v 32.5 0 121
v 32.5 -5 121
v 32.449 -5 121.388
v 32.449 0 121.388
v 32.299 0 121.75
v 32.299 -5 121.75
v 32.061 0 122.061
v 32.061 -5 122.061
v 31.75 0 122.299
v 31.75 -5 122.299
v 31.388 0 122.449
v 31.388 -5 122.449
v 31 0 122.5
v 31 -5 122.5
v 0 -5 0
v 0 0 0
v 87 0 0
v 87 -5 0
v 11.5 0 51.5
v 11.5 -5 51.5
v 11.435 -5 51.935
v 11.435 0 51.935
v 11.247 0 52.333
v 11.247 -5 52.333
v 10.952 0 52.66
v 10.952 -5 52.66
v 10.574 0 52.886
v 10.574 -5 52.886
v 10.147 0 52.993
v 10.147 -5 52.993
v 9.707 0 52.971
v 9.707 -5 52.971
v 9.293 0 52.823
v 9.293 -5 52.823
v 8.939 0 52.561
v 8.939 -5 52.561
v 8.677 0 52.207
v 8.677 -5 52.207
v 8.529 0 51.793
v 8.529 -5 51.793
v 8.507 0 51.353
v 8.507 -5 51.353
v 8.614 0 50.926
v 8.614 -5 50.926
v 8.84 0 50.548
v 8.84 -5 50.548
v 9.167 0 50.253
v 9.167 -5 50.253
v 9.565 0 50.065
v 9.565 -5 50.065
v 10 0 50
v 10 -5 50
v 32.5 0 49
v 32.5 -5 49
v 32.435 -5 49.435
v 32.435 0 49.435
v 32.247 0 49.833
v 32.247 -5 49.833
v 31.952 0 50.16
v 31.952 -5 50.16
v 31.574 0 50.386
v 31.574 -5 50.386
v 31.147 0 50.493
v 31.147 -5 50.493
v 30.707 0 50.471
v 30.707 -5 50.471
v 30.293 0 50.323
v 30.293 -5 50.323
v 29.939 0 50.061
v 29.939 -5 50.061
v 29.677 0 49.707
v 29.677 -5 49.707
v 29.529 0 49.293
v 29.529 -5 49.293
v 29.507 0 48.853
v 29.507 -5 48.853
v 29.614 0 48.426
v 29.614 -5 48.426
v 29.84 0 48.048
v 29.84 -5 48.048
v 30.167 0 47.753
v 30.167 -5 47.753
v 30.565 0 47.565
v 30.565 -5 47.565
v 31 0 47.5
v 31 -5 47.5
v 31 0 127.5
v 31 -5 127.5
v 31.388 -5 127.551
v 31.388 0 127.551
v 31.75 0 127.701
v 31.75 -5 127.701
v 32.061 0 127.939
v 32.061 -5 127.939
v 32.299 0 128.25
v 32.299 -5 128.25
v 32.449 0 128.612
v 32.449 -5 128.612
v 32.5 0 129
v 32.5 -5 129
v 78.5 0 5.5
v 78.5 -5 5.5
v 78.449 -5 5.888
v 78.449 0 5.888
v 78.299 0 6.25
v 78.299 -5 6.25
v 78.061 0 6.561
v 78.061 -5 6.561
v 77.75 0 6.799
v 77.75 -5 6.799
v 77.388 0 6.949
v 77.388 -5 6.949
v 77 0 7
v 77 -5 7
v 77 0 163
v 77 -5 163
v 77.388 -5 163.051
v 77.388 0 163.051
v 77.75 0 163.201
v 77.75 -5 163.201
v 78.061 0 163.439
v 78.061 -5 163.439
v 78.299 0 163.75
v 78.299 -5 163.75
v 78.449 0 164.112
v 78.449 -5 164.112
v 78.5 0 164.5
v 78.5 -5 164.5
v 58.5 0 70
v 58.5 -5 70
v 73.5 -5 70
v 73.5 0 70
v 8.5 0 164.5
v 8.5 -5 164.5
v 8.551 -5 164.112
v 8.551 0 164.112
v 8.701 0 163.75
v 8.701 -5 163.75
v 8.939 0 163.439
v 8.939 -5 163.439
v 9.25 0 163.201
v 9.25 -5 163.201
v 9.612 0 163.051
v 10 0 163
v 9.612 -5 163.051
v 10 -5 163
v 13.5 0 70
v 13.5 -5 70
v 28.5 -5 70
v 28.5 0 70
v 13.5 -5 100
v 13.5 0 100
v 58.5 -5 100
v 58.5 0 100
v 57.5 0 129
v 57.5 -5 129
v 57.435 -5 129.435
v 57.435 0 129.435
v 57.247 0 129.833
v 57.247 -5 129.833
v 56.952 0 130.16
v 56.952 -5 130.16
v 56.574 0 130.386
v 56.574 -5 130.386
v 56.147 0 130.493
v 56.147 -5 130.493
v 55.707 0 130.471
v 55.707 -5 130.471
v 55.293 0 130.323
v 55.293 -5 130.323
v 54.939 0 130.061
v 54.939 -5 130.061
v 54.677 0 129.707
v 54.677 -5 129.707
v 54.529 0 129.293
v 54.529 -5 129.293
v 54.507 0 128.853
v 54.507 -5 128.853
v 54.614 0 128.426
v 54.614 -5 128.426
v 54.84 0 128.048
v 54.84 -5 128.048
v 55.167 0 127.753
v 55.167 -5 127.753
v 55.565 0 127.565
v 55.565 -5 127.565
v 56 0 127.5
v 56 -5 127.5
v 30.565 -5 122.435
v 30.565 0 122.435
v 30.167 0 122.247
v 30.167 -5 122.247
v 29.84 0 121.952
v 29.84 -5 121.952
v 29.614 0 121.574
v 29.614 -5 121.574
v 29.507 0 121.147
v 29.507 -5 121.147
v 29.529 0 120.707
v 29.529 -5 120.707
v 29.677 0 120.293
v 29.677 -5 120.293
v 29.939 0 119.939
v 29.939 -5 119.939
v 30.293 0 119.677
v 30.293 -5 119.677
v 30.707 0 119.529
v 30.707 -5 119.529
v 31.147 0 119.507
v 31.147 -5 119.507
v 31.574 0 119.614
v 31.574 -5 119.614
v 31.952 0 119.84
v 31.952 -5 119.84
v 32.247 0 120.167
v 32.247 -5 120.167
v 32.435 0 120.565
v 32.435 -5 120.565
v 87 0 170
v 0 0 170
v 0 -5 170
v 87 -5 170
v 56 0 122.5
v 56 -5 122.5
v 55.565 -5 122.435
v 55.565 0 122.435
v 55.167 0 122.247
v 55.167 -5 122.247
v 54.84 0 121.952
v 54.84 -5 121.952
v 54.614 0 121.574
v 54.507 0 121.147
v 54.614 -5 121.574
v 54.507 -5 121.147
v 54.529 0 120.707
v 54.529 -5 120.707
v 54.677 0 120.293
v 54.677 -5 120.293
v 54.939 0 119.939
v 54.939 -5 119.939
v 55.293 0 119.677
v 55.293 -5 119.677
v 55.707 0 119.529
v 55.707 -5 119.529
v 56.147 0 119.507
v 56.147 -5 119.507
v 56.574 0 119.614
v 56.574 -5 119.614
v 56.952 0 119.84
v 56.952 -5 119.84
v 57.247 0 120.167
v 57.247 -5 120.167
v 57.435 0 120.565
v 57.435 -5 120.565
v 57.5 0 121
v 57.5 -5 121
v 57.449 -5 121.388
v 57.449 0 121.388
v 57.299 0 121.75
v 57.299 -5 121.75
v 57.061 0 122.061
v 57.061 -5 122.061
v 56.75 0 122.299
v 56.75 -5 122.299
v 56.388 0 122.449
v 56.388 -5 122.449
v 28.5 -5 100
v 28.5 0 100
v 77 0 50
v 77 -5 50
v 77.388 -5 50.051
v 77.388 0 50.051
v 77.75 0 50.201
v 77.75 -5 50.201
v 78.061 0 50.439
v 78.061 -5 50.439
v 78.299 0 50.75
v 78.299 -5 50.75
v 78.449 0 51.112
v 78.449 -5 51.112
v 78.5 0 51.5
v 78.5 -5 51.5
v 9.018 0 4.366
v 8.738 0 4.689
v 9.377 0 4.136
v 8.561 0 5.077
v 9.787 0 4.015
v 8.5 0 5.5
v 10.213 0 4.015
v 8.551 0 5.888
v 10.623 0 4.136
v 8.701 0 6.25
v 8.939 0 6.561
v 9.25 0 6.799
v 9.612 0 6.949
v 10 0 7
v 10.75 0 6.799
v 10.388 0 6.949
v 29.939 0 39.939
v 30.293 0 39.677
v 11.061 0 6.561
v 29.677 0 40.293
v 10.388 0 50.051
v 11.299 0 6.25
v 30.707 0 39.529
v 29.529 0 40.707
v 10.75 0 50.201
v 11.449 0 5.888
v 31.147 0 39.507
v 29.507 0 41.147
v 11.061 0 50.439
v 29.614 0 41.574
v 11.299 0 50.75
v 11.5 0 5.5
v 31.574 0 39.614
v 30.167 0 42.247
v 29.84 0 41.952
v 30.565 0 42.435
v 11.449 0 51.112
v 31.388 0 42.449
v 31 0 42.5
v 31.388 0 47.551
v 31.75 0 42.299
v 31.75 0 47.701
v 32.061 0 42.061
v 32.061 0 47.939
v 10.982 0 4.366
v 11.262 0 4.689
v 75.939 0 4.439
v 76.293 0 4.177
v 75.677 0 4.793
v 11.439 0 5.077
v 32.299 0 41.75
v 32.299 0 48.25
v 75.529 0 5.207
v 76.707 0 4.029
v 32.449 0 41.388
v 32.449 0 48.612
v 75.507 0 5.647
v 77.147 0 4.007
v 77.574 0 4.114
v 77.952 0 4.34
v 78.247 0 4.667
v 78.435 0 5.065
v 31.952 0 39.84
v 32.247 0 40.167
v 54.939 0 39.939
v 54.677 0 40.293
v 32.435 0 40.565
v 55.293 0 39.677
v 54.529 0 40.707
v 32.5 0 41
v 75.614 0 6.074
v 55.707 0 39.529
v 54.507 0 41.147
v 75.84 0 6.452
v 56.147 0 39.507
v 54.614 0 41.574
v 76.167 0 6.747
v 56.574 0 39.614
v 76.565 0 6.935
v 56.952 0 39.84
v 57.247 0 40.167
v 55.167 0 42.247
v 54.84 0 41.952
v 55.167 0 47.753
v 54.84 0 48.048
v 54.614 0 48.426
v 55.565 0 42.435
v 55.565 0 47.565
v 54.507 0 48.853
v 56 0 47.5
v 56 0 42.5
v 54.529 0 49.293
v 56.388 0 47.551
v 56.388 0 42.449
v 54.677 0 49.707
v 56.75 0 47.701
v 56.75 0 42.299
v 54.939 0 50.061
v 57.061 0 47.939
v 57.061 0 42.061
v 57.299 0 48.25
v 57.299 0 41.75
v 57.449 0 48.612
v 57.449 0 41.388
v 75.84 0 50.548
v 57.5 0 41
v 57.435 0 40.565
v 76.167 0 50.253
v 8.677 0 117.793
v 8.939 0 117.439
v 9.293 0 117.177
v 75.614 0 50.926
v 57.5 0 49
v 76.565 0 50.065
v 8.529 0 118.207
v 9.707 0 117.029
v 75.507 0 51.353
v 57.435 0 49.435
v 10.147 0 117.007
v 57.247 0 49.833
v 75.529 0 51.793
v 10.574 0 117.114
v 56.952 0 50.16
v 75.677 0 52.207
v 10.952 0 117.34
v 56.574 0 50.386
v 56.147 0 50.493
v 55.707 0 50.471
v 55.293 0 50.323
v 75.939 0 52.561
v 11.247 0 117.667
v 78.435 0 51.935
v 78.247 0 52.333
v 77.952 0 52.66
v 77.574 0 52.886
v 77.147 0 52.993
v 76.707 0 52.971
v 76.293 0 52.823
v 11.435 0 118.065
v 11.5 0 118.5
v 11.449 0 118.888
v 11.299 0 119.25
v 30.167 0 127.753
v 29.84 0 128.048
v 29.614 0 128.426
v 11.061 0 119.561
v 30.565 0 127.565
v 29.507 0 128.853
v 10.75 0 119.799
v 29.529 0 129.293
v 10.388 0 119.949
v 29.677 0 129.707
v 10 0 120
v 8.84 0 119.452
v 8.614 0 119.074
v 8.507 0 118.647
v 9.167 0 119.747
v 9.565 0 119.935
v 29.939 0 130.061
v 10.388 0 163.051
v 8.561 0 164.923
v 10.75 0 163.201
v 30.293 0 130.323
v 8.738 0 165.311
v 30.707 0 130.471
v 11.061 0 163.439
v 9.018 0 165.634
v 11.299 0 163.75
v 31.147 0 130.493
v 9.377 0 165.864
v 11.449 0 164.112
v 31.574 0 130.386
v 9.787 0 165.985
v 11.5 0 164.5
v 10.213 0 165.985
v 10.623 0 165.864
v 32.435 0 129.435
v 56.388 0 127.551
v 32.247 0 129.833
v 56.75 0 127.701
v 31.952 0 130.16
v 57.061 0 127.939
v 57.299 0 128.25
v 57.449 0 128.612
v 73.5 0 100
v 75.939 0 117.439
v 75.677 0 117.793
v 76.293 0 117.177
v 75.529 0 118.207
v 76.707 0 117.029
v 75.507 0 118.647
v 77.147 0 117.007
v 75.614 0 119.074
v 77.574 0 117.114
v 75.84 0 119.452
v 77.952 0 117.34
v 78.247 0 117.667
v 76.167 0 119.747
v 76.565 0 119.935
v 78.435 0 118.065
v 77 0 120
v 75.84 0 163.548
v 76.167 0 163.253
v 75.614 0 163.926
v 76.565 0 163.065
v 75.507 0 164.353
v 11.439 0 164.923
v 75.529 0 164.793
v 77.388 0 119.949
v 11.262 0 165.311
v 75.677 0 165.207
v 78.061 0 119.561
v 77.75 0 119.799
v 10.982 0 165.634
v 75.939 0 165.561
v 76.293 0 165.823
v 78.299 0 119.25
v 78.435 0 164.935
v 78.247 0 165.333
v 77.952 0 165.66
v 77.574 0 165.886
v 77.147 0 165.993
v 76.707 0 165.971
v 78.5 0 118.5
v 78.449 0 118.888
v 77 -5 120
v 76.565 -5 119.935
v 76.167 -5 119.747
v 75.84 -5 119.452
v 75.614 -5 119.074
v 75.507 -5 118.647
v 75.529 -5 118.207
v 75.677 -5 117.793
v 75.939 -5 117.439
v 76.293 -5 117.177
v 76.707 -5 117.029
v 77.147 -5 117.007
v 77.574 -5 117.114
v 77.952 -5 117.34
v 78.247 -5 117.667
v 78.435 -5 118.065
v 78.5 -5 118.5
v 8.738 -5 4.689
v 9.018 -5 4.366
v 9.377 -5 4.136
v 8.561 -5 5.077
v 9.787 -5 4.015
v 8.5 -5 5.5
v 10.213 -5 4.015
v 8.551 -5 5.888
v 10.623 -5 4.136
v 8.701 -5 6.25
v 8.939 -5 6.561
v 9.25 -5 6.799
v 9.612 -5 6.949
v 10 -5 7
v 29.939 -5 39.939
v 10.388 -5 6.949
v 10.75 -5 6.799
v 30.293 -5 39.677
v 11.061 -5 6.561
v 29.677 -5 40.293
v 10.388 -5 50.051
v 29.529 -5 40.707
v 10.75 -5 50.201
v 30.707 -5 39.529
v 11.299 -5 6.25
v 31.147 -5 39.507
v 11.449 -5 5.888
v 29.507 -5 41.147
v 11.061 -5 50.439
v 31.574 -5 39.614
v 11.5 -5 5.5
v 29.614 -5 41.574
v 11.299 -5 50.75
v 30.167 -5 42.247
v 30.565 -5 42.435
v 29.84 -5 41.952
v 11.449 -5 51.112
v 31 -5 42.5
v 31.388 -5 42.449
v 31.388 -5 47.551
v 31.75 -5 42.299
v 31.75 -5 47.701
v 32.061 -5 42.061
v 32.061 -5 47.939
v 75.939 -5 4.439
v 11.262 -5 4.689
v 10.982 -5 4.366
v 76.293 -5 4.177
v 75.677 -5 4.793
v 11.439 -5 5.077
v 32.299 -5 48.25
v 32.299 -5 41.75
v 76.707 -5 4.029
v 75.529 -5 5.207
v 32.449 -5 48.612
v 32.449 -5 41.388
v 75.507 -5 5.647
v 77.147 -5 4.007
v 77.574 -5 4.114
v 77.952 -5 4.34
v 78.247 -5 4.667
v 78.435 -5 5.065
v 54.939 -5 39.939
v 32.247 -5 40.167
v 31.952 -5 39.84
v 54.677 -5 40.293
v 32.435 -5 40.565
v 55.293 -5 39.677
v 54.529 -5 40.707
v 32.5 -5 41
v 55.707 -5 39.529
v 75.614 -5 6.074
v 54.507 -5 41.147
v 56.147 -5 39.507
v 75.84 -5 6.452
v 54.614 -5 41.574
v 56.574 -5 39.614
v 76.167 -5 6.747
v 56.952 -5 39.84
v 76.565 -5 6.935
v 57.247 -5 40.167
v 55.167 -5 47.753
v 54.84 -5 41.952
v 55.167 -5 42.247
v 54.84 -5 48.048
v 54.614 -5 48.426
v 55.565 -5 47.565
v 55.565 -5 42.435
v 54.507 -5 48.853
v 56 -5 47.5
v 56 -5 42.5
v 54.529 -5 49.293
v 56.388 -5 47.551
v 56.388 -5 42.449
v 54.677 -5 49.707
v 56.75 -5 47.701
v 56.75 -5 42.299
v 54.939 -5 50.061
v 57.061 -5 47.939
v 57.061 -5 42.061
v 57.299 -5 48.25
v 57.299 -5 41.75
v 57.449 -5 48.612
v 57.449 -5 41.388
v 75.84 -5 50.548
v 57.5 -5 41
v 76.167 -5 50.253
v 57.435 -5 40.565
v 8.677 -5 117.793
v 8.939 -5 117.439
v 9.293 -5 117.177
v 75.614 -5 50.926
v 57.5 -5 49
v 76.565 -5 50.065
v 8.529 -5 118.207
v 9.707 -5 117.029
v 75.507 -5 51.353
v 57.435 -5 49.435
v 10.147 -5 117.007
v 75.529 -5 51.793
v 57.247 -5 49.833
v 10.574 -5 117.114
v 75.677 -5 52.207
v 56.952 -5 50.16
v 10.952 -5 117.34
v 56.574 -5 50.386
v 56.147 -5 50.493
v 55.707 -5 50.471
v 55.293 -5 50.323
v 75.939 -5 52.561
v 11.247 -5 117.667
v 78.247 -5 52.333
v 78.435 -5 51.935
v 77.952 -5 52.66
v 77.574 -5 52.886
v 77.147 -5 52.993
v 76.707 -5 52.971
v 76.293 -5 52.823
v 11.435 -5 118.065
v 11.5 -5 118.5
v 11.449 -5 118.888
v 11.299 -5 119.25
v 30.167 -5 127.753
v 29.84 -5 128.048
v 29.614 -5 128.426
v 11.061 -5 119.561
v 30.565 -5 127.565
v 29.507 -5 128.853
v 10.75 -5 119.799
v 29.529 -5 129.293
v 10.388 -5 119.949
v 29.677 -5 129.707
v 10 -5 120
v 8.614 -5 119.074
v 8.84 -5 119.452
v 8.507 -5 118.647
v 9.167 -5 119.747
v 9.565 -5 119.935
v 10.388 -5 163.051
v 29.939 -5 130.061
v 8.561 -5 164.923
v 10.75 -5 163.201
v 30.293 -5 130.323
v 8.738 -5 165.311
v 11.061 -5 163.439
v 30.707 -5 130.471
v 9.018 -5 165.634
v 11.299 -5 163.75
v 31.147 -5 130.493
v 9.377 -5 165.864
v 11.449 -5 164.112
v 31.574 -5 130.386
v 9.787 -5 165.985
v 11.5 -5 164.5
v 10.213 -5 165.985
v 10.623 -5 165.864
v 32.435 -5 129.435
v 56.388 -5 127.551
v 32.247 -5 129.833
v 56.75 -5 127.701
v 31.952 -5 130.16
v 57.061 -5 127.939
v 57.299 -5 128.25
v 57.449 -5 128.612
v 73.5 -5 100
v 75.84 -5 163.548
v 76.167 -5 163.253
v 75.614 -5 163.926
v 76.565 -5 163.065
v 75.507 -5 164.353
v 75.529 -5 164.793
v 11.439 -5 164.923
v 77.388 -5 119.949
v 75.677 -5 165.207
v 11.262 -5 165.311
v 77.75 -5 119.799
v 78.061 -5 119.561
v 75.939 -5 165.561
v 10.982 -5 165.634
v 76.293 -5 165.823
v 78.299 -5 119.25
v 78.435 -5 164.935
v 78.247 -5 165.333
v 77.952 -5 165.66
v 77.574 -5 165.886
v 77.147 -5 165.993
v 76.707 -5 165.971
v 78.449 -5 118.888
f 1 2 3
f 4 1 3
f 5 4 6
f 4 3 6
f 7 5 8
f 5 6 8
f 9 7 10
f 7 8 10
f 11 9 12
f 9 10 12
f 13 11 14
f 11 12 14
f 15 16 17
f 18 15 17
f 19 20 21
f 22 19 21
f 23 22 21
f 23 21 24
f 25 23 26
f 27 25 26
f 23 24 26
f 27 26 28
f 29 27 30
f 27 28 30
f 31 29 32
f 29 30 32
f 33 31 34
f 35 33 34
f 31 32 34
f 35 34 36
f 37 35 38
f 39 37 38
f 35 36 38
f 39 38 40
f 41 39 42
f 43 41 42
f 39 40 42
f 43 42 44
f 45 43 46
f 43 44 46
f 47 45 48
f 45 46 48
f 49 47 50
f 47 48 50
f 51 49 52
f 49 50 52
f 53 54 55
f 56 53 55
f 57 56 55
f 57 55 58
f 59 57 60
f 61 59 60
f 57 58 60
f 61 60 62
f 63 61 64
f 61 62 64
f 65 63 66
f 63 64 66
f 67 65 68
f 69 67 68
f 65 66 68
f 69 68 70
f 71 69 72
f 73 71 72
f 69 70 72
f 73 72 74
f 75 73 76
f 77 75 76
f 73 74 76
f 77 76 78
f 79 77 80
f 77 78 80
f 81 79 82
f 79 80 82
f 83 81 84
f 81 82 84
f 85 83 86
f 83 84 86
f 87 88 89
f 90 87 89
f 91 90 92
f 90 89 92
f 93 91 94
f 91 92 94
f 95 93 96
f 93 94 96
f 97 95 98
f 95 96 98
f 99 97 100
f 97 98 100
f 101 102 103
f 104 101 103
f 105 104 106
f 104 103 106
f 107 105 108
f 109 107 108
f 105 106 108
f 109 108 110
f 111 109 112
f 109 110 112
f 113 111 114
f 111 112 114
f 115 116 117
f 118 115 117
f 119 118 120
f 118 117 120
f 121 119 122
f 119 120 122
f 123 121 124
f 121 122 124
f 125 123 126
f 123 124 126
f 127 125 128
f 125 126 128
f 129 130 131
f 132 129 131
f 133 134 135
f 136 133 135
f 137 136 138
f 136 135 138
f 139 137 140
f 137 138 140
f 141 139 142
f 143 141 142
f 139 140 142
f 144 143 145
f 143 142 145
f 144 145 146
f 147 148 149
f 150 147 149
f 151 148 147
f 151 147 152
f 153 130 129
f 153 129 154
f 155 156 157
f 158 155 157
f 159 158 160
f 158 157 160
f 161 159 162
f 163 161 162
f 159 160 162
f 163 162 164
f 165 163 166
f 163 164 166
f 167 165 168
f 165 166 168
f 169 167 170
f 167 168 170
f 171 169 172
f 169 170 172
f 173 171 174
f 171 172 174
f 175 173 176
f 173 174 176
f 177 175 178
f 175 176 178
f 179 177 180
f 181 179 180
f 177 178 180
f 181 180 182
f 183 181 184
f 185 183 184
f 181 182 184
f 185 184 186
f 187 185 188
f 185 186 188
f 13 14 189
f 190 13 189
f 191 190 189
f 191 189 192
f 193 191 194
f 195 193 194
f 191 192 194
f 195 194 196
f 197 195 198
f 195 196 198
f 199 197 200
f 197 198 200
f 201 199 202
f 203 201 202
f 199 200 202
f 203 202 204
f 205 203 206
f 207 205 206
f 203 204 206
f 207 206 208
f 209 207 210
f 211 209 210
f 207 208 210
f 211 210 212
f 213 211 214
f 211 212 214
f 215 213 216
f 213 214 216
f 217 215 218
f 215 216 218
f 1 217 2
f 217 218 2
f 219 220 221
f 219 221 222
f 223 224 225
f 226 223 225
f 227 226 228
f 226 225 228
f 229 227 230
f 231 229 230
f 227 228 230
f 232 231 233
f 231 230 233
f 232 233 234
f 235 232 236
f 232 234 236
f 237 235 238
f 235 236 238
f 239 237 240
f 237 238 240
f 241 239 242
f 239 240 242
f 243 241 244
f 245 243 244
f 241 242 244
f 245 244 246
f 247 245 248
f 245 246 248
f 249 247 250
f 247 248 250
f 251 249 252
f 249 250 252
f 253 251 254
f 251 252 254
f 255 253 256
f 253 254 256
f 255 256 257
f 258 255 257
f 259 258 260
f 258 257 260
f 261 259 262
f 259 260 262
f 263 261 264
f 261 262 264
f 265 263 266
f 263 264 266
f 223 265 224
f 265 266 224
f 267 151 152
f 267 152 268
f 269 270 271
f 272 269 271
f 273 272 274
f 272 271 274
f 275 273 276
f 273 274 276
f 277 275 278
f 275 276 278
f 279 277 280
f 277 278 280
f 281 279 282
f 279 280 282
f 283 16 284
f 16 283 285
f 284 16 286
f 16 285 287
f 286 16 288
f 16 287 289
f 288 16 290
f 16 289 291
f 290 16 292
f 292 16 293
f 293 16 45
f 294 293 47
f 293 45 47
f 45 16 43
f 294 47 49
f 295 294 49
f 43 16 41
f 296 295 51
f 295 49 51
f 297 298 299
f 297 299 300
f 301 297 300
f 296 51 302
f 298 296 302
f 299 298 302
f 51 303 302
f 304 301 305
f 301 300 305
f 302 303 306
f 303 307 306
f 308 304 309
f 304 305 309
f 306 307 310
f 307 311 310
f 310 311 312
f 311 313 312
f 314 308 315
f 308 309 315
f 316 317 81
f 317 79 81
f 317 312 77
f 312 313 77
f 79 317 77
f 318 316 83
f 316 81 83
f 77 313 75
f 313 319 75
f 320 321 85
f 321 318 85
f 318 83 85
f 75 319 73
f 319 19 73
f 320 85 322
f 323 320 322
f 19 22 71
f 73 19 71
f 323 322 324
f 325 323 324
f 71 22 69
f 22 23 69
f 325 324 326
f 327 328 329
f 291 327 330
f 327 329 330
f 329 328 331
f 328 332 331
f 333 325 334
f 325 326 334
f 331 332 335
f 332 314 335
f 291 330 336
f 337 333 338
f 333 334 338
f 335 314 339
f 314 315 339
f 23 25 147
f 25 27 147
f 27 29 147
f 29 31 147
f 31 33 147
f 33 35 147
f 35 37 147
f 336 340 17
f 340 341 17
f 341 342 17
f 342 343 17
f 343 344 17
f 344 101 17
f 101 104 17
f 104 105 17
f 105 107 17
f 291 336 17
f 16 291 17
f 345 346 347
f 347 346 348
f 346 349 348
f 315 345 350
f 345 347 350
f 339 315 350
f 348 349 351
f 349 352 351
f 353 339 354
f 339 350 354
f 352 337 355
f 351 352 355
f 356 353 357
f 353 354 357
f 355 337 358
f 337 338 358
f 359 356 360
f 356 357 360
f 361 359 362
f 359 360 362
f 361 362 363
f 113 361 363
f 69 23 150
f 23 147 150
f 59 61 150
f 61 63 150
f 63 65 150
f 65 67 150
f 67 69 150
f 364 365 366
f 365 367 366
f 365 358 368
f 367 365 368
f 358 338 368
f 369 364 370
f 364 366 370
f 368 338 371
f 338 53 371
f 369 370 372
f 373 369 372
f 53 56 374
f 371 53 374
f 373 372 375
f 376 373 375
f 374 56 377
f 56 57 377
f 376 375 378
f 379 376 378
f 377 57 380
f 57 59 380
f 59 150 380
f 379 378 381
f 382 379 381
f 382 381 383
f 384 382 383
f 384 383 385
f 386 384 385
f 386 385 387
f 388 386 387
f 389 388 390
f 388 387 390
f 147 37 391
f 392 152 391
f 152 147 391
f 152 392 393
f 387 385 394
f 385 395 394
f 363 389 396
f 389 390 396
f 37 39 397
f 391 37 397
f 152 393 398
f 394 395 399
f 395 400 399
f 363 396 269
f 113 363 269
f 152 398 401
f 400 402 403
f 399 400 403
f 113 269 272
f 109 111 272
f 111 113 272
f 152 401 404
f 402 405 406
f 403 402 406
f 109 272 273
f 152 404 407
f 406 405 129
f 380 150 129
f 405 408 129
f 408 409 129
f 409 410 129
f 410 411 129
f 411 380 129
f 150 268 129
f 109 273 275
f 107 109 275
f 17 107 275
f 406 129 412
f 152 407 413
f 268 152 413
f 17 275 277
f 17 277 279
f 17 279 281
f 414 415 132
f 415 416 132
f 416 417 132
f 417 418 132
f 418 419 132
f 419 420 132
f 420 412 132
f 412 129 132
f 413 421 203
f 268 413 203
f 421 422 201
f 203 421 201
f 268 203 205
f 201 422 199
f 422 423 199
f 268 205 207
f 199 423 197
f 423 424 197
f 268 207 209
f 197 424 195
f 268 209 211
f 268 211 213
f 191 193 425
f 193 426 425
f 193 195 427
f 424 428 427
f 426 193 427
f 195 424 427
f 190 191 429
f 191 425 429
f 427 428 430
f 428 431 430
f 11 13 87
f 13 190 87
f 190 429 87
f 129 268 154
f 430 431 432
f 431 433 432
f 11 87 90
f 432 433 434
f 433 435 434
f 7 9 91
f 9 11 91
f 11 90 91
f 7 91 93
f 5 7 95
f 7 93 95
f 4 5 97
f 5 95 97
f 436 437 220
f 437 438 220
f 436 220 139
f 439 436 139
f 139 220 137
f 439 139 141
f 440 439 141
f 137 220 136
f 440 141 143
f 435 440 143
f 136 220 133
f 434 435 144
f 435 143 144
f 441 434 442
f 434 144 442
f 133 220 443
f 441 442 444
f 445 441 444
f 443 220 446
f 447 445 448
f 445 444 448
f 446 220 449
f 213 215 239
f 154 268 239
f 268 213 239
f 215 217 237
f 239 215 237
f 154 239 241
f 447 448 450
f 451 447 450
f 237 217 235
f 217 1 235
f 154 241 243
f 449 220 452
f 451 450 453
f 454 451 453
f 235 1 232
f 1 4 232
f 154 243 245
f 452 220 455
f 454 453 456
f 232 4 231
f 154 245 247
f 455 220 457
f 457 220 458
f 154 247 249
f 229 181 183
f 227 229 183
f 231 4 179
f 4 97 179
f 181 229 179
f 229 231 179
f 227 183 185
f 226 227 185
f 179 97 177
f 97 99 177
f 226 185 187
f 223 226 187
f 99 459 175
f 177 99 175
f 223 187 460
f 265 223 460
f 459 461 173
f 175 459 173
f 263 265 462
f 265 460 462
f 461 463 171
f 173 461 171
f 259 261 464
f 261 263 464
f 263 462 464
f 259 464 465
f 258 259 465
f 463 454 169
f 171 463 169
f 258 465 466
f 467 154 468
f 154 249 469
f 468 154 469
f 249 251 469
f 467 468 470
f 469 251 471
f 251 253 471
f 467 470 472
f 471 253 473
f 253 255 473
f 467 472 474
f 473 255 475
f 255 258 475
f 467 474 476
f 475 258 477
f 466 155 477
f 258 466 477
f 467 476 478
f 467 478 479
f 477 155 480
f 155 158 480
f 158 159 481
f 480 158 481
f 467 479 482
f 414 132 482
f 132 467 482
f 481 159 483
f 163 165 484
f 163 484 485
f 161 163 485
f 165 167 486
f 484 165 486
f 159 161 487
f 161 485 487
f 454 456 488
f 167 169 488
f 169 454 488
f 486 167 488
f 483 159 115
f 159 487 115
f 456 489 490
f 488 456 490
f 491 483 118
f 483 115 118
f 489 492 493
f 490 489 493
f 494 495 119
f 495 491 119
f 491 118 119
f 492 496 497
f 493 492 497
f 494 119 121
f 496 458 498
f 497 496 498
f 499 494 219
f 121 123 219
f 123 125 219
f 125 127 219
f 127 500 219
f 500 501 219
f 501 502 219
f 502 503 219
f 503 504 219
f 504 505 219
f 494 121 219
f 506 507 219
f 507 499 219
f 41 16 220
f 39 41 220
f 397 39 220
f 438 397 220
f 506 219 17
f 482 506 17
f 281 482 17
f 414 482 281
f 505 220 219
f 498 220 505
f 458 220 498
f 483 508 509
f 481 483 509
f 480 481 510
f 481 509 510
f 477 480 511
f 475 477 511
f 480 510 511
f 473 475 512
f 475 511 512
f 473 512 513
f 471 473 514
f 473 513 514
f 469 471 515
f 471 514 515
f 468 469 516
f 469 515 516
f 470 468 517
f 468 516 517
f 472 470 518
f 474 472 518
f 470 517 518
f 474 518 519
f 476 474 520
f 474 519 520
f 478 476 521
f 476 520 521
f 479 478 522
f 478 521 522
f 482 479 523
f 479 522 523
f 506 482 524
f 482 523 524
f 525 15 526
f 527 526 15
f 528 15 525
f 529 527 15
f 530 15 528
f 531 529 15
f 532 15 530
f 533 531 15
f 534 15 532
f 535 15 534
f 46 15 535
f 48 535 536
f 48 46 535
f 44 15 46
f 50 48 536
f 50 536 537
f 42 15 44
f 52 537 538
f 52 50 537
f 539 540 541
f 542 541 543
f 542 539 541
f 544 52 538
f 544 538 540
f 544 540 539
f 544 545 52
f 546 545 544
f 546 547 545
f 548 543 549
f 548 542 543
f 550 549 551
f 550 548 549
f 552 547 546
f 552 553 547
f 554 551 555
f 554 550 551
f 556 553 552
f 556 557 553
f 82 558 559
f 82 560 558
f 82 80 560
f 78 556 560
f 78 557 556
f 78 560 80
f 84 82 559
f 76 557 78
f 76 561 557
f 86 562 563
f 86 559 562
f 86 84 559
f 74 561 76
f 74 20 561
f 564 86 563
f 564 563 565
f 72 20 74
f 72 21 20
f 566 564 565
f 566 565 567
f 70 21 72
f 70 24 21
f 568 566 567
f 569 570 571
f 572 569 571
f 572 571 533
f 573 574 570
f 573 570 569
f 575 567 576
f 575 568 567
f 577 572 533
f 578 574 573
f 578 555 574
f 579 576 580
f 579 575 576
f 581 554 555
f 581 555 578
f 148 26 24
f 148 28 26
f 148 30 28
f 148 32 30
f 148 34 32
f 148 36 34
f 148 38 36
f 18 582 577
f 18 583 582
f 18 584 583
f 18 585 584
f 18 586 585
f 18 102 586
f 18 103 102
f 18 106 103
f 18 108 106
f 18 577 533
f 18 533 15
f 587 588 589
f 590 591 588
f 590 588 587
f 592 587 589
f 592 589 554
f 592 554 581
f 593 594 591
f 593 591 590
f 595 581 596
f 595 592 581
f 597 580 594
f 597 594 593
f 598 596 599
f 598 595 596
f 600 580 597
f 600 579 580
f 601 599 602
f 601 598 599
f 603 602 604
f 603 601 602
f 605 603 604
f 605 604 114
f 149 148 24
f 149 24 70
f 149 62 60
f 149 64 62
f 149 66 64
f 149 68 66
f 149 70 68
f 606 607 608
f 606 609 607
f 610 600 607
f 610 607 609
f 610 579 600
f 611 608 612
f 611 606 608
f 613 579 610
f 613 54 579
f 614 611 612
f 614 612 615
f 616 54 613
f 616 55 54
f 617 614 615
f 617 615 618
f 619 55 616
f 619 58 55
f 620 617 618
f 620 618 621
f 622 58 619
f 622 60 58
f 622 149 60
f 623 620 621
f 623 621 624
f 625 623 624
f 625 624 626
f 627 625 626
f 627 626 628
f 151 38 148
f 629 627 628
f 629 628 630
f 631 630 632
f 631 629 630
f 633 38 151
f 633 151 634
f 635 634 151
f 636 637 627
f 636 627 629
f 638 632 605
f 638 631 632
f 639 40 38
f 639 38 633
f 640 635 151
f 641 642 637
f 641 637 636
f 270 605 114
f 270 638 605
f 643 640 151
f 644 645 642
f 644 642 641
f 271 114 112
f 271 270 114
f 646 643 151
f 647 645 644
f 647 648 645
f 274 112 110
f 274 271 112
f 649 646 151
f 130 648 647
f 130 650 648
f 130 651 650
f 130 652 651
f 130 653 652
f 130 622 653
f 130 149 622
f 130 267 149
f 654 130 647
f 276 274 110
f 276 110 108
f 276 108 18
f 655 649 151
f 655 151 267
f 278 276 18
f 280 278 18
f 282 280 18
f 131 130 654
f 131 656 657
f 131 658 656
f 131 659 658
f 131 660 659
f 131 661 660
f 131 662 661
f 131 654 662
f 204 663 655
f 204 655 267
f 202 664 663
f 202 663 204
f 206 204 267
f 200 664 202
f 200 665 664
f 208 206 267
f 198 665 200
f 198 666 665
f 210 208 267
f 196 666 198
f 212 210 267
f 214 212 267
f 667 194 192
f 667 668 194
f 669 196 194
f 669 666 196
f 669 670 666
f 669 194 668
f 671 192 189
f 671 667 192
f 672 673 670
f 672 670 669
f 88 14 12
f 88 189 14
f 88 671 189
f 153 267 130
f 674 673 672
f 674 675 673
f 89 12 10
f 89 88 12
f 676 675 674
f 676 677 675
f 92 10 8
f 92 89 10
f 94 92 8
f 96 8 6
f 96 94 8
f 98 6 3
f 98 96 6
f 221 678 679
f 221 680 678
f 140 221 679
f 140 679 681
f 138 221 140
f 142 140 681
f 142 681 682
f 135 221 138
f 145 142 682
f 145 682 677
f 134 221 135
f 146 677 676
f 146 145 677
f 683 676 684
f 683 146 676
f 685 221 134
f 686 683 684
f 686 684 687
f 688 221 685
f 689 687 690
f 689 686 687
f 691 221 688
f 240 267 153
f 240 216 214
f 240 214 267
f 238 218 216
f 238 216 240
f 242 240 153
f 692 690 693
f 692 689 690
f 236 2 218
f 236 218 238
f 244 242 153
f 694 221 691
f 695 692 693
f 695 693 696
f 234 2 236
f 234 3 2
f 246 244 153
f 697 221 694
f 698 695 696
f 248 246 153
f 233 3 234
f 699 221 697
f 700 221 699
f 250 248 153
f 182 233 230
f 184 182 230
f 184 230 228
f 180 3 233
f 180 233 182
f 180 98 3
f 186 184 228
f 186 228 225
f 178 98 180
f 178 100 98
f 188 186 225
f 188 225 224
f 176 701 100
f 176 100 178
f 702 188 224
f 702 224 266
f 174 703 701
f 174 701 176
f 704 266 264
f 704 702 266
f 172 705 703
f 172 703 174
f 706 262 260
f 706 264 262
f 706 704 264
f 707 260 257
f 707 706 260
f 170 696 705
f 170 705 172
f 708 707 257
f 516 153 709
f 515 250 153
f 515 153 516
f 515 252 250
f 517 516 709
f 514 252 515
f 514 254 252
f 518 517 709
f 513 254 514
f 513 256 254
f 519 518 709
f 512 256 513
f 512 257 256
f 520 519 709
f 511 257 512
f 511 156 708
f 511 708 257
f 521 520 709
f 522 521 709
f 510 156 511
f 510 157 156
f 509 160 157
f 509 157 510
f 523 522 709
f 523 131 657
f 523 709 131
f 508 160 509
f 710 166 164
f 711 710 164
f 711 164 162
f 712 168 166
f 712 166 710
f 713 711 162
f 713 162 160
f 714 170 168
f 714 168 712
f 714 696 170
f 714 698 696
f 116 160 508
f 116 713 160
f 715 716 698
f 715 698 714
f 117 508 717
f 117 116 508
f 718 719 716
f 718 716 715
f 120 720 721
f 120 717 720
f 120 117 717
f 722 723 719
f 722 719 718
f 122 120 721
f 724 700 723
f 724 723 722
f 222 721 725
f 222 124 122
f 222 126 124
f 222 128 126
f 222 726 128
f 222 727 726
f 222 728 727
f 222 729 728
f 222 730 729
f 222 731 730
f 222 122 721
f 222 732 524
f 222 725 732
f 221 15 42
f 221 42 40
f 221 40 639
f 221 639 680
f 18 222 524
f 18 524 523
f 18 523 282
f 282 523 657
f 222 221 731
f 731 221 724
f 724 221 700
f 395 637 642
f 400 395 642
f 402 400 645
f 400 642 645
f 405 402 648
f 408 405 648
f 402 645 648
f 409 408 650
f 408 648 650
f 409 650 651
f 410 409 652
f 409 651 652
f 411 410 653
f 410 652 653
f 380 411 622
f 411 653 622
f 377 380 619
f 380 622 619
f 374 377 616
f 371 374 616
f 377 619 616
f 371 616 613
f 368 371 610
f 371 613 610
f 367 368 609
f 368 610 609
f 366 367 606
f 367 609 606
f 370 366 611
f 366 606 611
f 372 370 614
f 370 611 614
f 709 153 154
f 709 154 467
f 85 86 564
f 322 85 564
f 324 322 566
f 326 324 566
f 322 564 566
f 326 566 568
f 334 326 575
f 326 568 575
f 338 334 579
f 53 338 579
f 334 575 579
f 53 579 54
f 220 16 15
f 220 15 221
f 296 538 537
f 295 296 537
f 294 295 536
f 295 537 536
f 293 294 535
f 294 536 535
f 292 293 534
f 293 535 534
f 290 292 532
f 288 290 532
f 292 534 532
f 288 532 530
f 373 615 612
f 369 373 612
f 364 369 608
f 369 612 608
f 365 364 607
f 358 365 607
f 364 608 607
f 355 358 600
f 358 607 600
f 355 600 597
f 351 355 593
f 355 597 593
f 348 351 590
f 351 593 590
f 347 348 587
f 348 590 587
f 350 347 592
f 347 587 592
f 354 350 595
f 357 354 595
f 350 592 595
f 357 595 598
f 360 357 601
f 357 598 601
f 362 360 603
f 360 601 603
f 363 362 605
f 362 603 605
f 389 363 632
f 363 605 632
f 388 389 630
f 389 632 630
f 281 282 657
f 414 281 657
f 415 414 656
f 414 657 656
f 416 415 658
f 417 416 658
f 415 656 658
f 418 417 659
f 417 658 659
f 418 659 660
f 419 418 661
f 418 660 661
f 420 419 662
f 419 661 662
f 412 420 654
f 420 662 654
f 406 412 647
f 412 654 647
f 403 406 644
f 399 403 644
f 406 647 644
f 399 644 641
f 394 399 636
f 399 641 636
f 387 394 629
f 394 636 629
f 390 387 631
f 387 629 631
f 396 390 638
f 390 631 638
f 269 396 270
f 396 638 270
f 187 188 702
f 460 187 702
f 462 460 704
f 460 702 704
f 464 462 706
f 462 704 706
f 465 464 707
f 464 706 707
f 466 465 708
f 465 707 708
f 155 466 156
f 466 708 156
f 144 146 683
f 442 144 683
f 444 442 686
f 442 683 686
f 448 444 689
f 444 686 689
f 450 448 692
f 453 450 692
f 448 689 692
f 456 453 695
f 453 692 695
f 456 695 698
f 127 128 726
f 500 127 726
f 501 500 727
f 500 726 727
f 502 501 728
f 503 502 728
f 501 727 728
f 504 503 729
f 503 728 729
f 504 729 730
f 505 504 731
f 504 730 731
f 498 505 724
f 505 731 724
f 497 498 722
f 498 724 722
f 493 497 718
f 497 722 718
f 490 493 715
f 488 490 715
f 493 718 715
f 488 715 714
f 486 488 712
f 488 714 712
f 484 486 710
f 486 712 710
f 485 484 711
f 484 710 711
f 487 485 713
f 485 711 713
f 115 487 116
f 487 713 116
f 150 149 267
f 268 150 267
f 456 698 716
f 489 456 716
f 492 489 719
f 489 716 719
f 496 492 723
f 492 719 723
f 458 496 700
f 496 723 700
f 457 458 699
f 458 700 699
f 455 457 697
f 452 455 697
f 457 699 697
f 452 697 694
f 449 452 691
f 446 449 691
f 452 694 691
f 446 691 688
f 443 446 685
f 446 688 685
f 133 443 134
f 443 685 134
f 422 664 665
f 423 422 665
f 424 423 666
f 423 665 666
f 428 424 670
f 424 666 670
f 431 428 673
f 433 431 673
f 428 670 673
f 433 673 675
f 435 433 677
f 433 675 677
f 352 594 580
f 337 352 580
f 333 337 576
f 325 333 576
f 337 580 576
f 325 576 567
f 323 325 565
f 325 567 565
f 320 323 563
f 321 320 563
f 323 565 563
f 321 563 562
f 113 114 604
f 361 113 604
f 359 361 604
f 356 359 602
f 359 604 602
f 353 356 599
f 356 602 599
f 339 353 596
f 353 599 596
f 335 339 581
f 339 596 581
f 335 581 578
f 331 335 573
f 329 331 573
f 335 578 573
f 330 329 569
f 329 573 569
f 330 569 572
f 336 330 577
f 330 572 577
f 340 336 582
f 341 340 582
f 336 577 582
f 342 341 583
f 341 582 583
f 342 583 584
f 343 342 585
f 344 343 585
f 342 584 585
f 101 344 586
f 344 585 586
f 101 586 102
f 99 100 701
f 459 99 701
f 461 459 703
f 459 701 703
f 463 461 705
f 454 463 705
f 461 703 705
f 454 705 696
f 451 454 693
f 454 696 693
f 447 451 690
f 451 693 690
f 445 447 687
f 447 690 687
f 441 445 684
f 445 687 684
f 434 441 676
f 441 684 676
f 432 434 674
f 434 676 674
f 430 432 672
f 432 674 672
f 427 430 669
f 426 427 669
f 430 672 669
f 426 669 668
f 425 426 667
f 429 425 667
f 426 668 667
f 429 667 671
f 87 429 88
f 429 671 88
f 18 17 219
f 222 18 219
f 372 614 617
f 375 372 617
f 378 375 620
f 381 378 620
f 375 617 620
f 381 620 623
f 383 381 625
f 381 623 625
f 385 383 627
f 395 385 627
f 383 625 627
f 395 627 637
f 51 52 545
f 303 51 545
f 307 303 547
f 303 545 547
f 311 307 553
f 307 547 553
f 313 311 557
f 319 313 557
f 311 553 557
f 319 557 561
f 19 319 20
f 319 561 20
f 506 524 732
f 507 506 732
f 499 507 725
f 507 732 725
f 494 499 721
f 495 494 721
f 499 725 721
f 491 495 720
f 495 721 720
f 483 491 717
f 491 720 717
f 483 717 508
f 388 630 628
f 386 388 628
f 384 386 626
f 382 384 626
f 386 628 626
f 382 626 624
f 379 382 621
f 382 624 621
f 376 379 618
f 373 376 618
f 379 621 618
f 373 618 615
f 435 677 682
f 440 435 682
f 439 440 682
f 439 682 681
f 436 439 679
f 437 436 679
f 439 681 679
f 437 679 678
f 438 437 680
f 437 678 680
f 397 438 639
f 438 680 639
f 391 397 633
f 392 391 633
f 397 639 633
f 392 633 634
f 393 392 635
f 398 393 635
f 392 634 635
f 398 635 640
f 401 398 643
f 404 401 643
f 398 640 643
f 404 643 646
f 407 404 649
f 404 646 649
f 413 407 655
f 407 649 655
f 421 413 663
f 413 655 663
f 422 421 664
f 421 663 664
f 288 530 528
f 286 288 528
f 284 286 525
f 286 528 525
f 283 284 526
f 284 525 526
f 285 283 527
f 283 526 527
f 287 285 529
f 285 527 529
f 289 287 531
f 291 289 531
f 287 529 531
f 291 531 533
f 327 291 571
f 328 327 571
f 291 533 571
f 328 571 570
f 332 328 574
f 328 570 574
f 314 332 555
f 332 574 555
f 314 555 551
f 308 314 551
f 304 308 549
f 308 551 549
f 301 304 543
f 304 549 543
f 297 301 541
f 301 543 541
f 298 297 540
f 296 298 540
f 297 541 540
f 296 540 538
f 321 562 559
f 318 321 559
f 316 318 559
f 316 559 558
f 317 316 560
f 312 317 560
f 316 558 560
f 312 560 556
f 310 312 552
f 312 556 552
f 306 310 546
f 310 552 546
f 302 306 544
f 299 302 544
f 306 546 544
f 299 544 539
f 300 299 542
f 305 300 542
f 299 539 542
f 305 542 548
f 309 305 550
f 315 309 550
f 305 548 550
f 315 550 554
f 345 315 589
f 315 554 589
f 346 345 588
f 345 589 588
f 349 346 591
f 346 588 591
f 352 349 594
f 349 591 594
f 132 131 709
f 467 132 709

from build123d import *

# Parameters (mm, degrees)
F0_W     = 87
F0_H     = 170
F1_DEPTH = 5
F2_W     = 15
F2_H     = 30
F3_DEPTH = 25


with BuildPart() as f1:
    # F0 (on Front) → F1 (new body)
    with BuildSketch(Plane.XZ):
        with Locations((43.5, 85)):
            Rectangle(F0_W, F0_H)
    extrude(amount=F1_DEPTH)

    # F2 (on face) → F3 (cut)
    with BuildSketch(Plane.XZ.offset(5)):
        with BuildLine():
            ThreePointArc((10, 7), (8.93934, 6.56066), (8.5, 5.5))
            Line((8.5, 5.5), (10, 5.5))
            Line((10, 5.5), (10, 7))
        make_face()
        with BuildLine():
            ThreePointArc((11.5, 51.5), (8.93934, 52.56066), (10, 50))
            ThreePointArc((10, 50), (11.06066, 50.43934), (11.5, 51.5))
        make_face()
        with BuildLine():
            Line((10, 5.5), (8.5, 5.5))
            ThreePointArc((8.5, 5.5), (10, 4), (11.5, 5.5))
            ThreePointArc((11.5, 5.5), (11.06066, 6.56066), (10, 7))
            Line((10, 7), (10, 5.5))
        make_face()
        with BuildLine():
            ThreePointArc((77, 7), (75.93934, 4.43934), (78.5, 5.5))
            Line((78.5, 5.5), (77, 5.5))
            Line((77, 5.5), (77, 7))
        make_face()
        with BuildLine():
            Line((77, 5.5), (78.5, 5.5))
            ThreePointArc((78.5, 5.5), (78.06066, 6.56066), (77, 7))
            Line((77, 7), (77, 5.5))
        make_face()
        with BuildLine():
            ThreePointArc((78.5, 51.5), (75.93934, 52.56066), (77, 50))
            ThreePointArc((77, 50), (78.06066, 50.43934), (78.5, 51.5))
        make_face()
        with BuildLine():
            ThreePointArc((11.5, 164.5), (10, 166), (8.5, 164.5))
            Line((8.5, 164.5), (10, 164.5))
            Line((10, 164.5), (10, 163))
            ThreePointArc((10, 163), (11.06066, 163.43934), (11.5, 164.5))
        make_face()
        with BuildLine():
            ThreePointArc((11.5, 118.5), (11.06066, 119.56066), (10, 120))
            ThreePointArc((10, 120), (8.93934, 117.43934), (11.5, 118.5))
        make_face()
        with BuildLine():
            Line((10, 164.5), (8.5, 164.5))
            ThreePointArc((8.5, 164.5), (8.93934, 163.43934), (10, 163))
            Line((10, 163), (10, 164.5))
        make_face()
        with BuildLine():
            ThreePointArc((77, 163), (78.06066, 163.43934), (78.5, 164.5))
            Line((78.5, 164.5), (77, 164.5))
            Line((77, 164.5), (77, 163))
        make_face()
        with BuildLine():
            Line((77, 164.5), (78.5, 164.5))
            ThreePointArc((78.5, 164.5), (75.93934, 165.56066), (77, 163))
            Line((77, 163), (77, 164.5))
        make_face()
        with BuildLine():
            ThreePointArc((78.5, 118.5), (78.06066, 119.56066), (77, 120))
            ThreePointArc((77, 120), (75.93934, 117.43934), (78.5, 118.5))
        make_face()
        with Locations((66, 85)):
            Rectangle(F2_W, F2_H)
        with Locations((21, 85)):
            Rectangle(F2_W, F2_H)
        with BuildLine():
            ThreePointArc((32.5, 121), (32.06066, 122.06066), (31, 122.5))
            ThreePointArc((31, 122.5), (29.93934, 119.93934), (32.5, 121))
        make_face()
        with BuildLine():
            ThreePointArc((32.5, 129), (29.93934, 130.06066), (31, 127.5))
            ThreePointArc((31, 127.5), (32.06066, 127.93934), (32.5, 129))
        make_face()
        with BuildLine():
            ThreePointArc((57.5, 129), (54.93934, 130.06066), (56, 127.5))
            ThreePointArc((56, 127.5), (57.06066, 127.93934), (57.5, 129))
        make_face()
        with BuildLine():
            ThreePointArc((57.5, 121), (57.06066, 122.06066), (56, 122.5))
            ThreePointArc((56, 122.5), (54.93934, 119.93934), (57.5, 121))
        make_face()
        with BuildLine():
            ThreePointArc((57.5, 49), (54.93934, 50.06066), (56, 47.5))
            ThreePointArc((56, 47.5), (57.06066, 47.93934), (57.5, 49))
        make_face()
        with BuildLine():
            ThreePointArc((57.5, 41), (57.06066, 42.06066), (56, 42.5))
            ThreePointArc((56, 42.5), (54.93934, 39.93934), (57.5, 41))
        make_face()
        with BuildLine():
            ThreePointArc((32.5, 41), (32.06066, 42.06066), (31, 42.5))
            ThreePointArc((31, 42.5), (29.93934, 39.93934), (32.5, 41))
        make_face()
        with BuildLine():
            ThreePointArc((32.5, 49), (29.93934, 50.06066), (31, 47.5))
            ThreePointArc((31, 47.5), (32.06066, 47.93934), (32.5, 49))
        make_face()
    extrude(amount=-F3_DEPTH, mode=Mode.SUBTRACT)


solid = f1.part
